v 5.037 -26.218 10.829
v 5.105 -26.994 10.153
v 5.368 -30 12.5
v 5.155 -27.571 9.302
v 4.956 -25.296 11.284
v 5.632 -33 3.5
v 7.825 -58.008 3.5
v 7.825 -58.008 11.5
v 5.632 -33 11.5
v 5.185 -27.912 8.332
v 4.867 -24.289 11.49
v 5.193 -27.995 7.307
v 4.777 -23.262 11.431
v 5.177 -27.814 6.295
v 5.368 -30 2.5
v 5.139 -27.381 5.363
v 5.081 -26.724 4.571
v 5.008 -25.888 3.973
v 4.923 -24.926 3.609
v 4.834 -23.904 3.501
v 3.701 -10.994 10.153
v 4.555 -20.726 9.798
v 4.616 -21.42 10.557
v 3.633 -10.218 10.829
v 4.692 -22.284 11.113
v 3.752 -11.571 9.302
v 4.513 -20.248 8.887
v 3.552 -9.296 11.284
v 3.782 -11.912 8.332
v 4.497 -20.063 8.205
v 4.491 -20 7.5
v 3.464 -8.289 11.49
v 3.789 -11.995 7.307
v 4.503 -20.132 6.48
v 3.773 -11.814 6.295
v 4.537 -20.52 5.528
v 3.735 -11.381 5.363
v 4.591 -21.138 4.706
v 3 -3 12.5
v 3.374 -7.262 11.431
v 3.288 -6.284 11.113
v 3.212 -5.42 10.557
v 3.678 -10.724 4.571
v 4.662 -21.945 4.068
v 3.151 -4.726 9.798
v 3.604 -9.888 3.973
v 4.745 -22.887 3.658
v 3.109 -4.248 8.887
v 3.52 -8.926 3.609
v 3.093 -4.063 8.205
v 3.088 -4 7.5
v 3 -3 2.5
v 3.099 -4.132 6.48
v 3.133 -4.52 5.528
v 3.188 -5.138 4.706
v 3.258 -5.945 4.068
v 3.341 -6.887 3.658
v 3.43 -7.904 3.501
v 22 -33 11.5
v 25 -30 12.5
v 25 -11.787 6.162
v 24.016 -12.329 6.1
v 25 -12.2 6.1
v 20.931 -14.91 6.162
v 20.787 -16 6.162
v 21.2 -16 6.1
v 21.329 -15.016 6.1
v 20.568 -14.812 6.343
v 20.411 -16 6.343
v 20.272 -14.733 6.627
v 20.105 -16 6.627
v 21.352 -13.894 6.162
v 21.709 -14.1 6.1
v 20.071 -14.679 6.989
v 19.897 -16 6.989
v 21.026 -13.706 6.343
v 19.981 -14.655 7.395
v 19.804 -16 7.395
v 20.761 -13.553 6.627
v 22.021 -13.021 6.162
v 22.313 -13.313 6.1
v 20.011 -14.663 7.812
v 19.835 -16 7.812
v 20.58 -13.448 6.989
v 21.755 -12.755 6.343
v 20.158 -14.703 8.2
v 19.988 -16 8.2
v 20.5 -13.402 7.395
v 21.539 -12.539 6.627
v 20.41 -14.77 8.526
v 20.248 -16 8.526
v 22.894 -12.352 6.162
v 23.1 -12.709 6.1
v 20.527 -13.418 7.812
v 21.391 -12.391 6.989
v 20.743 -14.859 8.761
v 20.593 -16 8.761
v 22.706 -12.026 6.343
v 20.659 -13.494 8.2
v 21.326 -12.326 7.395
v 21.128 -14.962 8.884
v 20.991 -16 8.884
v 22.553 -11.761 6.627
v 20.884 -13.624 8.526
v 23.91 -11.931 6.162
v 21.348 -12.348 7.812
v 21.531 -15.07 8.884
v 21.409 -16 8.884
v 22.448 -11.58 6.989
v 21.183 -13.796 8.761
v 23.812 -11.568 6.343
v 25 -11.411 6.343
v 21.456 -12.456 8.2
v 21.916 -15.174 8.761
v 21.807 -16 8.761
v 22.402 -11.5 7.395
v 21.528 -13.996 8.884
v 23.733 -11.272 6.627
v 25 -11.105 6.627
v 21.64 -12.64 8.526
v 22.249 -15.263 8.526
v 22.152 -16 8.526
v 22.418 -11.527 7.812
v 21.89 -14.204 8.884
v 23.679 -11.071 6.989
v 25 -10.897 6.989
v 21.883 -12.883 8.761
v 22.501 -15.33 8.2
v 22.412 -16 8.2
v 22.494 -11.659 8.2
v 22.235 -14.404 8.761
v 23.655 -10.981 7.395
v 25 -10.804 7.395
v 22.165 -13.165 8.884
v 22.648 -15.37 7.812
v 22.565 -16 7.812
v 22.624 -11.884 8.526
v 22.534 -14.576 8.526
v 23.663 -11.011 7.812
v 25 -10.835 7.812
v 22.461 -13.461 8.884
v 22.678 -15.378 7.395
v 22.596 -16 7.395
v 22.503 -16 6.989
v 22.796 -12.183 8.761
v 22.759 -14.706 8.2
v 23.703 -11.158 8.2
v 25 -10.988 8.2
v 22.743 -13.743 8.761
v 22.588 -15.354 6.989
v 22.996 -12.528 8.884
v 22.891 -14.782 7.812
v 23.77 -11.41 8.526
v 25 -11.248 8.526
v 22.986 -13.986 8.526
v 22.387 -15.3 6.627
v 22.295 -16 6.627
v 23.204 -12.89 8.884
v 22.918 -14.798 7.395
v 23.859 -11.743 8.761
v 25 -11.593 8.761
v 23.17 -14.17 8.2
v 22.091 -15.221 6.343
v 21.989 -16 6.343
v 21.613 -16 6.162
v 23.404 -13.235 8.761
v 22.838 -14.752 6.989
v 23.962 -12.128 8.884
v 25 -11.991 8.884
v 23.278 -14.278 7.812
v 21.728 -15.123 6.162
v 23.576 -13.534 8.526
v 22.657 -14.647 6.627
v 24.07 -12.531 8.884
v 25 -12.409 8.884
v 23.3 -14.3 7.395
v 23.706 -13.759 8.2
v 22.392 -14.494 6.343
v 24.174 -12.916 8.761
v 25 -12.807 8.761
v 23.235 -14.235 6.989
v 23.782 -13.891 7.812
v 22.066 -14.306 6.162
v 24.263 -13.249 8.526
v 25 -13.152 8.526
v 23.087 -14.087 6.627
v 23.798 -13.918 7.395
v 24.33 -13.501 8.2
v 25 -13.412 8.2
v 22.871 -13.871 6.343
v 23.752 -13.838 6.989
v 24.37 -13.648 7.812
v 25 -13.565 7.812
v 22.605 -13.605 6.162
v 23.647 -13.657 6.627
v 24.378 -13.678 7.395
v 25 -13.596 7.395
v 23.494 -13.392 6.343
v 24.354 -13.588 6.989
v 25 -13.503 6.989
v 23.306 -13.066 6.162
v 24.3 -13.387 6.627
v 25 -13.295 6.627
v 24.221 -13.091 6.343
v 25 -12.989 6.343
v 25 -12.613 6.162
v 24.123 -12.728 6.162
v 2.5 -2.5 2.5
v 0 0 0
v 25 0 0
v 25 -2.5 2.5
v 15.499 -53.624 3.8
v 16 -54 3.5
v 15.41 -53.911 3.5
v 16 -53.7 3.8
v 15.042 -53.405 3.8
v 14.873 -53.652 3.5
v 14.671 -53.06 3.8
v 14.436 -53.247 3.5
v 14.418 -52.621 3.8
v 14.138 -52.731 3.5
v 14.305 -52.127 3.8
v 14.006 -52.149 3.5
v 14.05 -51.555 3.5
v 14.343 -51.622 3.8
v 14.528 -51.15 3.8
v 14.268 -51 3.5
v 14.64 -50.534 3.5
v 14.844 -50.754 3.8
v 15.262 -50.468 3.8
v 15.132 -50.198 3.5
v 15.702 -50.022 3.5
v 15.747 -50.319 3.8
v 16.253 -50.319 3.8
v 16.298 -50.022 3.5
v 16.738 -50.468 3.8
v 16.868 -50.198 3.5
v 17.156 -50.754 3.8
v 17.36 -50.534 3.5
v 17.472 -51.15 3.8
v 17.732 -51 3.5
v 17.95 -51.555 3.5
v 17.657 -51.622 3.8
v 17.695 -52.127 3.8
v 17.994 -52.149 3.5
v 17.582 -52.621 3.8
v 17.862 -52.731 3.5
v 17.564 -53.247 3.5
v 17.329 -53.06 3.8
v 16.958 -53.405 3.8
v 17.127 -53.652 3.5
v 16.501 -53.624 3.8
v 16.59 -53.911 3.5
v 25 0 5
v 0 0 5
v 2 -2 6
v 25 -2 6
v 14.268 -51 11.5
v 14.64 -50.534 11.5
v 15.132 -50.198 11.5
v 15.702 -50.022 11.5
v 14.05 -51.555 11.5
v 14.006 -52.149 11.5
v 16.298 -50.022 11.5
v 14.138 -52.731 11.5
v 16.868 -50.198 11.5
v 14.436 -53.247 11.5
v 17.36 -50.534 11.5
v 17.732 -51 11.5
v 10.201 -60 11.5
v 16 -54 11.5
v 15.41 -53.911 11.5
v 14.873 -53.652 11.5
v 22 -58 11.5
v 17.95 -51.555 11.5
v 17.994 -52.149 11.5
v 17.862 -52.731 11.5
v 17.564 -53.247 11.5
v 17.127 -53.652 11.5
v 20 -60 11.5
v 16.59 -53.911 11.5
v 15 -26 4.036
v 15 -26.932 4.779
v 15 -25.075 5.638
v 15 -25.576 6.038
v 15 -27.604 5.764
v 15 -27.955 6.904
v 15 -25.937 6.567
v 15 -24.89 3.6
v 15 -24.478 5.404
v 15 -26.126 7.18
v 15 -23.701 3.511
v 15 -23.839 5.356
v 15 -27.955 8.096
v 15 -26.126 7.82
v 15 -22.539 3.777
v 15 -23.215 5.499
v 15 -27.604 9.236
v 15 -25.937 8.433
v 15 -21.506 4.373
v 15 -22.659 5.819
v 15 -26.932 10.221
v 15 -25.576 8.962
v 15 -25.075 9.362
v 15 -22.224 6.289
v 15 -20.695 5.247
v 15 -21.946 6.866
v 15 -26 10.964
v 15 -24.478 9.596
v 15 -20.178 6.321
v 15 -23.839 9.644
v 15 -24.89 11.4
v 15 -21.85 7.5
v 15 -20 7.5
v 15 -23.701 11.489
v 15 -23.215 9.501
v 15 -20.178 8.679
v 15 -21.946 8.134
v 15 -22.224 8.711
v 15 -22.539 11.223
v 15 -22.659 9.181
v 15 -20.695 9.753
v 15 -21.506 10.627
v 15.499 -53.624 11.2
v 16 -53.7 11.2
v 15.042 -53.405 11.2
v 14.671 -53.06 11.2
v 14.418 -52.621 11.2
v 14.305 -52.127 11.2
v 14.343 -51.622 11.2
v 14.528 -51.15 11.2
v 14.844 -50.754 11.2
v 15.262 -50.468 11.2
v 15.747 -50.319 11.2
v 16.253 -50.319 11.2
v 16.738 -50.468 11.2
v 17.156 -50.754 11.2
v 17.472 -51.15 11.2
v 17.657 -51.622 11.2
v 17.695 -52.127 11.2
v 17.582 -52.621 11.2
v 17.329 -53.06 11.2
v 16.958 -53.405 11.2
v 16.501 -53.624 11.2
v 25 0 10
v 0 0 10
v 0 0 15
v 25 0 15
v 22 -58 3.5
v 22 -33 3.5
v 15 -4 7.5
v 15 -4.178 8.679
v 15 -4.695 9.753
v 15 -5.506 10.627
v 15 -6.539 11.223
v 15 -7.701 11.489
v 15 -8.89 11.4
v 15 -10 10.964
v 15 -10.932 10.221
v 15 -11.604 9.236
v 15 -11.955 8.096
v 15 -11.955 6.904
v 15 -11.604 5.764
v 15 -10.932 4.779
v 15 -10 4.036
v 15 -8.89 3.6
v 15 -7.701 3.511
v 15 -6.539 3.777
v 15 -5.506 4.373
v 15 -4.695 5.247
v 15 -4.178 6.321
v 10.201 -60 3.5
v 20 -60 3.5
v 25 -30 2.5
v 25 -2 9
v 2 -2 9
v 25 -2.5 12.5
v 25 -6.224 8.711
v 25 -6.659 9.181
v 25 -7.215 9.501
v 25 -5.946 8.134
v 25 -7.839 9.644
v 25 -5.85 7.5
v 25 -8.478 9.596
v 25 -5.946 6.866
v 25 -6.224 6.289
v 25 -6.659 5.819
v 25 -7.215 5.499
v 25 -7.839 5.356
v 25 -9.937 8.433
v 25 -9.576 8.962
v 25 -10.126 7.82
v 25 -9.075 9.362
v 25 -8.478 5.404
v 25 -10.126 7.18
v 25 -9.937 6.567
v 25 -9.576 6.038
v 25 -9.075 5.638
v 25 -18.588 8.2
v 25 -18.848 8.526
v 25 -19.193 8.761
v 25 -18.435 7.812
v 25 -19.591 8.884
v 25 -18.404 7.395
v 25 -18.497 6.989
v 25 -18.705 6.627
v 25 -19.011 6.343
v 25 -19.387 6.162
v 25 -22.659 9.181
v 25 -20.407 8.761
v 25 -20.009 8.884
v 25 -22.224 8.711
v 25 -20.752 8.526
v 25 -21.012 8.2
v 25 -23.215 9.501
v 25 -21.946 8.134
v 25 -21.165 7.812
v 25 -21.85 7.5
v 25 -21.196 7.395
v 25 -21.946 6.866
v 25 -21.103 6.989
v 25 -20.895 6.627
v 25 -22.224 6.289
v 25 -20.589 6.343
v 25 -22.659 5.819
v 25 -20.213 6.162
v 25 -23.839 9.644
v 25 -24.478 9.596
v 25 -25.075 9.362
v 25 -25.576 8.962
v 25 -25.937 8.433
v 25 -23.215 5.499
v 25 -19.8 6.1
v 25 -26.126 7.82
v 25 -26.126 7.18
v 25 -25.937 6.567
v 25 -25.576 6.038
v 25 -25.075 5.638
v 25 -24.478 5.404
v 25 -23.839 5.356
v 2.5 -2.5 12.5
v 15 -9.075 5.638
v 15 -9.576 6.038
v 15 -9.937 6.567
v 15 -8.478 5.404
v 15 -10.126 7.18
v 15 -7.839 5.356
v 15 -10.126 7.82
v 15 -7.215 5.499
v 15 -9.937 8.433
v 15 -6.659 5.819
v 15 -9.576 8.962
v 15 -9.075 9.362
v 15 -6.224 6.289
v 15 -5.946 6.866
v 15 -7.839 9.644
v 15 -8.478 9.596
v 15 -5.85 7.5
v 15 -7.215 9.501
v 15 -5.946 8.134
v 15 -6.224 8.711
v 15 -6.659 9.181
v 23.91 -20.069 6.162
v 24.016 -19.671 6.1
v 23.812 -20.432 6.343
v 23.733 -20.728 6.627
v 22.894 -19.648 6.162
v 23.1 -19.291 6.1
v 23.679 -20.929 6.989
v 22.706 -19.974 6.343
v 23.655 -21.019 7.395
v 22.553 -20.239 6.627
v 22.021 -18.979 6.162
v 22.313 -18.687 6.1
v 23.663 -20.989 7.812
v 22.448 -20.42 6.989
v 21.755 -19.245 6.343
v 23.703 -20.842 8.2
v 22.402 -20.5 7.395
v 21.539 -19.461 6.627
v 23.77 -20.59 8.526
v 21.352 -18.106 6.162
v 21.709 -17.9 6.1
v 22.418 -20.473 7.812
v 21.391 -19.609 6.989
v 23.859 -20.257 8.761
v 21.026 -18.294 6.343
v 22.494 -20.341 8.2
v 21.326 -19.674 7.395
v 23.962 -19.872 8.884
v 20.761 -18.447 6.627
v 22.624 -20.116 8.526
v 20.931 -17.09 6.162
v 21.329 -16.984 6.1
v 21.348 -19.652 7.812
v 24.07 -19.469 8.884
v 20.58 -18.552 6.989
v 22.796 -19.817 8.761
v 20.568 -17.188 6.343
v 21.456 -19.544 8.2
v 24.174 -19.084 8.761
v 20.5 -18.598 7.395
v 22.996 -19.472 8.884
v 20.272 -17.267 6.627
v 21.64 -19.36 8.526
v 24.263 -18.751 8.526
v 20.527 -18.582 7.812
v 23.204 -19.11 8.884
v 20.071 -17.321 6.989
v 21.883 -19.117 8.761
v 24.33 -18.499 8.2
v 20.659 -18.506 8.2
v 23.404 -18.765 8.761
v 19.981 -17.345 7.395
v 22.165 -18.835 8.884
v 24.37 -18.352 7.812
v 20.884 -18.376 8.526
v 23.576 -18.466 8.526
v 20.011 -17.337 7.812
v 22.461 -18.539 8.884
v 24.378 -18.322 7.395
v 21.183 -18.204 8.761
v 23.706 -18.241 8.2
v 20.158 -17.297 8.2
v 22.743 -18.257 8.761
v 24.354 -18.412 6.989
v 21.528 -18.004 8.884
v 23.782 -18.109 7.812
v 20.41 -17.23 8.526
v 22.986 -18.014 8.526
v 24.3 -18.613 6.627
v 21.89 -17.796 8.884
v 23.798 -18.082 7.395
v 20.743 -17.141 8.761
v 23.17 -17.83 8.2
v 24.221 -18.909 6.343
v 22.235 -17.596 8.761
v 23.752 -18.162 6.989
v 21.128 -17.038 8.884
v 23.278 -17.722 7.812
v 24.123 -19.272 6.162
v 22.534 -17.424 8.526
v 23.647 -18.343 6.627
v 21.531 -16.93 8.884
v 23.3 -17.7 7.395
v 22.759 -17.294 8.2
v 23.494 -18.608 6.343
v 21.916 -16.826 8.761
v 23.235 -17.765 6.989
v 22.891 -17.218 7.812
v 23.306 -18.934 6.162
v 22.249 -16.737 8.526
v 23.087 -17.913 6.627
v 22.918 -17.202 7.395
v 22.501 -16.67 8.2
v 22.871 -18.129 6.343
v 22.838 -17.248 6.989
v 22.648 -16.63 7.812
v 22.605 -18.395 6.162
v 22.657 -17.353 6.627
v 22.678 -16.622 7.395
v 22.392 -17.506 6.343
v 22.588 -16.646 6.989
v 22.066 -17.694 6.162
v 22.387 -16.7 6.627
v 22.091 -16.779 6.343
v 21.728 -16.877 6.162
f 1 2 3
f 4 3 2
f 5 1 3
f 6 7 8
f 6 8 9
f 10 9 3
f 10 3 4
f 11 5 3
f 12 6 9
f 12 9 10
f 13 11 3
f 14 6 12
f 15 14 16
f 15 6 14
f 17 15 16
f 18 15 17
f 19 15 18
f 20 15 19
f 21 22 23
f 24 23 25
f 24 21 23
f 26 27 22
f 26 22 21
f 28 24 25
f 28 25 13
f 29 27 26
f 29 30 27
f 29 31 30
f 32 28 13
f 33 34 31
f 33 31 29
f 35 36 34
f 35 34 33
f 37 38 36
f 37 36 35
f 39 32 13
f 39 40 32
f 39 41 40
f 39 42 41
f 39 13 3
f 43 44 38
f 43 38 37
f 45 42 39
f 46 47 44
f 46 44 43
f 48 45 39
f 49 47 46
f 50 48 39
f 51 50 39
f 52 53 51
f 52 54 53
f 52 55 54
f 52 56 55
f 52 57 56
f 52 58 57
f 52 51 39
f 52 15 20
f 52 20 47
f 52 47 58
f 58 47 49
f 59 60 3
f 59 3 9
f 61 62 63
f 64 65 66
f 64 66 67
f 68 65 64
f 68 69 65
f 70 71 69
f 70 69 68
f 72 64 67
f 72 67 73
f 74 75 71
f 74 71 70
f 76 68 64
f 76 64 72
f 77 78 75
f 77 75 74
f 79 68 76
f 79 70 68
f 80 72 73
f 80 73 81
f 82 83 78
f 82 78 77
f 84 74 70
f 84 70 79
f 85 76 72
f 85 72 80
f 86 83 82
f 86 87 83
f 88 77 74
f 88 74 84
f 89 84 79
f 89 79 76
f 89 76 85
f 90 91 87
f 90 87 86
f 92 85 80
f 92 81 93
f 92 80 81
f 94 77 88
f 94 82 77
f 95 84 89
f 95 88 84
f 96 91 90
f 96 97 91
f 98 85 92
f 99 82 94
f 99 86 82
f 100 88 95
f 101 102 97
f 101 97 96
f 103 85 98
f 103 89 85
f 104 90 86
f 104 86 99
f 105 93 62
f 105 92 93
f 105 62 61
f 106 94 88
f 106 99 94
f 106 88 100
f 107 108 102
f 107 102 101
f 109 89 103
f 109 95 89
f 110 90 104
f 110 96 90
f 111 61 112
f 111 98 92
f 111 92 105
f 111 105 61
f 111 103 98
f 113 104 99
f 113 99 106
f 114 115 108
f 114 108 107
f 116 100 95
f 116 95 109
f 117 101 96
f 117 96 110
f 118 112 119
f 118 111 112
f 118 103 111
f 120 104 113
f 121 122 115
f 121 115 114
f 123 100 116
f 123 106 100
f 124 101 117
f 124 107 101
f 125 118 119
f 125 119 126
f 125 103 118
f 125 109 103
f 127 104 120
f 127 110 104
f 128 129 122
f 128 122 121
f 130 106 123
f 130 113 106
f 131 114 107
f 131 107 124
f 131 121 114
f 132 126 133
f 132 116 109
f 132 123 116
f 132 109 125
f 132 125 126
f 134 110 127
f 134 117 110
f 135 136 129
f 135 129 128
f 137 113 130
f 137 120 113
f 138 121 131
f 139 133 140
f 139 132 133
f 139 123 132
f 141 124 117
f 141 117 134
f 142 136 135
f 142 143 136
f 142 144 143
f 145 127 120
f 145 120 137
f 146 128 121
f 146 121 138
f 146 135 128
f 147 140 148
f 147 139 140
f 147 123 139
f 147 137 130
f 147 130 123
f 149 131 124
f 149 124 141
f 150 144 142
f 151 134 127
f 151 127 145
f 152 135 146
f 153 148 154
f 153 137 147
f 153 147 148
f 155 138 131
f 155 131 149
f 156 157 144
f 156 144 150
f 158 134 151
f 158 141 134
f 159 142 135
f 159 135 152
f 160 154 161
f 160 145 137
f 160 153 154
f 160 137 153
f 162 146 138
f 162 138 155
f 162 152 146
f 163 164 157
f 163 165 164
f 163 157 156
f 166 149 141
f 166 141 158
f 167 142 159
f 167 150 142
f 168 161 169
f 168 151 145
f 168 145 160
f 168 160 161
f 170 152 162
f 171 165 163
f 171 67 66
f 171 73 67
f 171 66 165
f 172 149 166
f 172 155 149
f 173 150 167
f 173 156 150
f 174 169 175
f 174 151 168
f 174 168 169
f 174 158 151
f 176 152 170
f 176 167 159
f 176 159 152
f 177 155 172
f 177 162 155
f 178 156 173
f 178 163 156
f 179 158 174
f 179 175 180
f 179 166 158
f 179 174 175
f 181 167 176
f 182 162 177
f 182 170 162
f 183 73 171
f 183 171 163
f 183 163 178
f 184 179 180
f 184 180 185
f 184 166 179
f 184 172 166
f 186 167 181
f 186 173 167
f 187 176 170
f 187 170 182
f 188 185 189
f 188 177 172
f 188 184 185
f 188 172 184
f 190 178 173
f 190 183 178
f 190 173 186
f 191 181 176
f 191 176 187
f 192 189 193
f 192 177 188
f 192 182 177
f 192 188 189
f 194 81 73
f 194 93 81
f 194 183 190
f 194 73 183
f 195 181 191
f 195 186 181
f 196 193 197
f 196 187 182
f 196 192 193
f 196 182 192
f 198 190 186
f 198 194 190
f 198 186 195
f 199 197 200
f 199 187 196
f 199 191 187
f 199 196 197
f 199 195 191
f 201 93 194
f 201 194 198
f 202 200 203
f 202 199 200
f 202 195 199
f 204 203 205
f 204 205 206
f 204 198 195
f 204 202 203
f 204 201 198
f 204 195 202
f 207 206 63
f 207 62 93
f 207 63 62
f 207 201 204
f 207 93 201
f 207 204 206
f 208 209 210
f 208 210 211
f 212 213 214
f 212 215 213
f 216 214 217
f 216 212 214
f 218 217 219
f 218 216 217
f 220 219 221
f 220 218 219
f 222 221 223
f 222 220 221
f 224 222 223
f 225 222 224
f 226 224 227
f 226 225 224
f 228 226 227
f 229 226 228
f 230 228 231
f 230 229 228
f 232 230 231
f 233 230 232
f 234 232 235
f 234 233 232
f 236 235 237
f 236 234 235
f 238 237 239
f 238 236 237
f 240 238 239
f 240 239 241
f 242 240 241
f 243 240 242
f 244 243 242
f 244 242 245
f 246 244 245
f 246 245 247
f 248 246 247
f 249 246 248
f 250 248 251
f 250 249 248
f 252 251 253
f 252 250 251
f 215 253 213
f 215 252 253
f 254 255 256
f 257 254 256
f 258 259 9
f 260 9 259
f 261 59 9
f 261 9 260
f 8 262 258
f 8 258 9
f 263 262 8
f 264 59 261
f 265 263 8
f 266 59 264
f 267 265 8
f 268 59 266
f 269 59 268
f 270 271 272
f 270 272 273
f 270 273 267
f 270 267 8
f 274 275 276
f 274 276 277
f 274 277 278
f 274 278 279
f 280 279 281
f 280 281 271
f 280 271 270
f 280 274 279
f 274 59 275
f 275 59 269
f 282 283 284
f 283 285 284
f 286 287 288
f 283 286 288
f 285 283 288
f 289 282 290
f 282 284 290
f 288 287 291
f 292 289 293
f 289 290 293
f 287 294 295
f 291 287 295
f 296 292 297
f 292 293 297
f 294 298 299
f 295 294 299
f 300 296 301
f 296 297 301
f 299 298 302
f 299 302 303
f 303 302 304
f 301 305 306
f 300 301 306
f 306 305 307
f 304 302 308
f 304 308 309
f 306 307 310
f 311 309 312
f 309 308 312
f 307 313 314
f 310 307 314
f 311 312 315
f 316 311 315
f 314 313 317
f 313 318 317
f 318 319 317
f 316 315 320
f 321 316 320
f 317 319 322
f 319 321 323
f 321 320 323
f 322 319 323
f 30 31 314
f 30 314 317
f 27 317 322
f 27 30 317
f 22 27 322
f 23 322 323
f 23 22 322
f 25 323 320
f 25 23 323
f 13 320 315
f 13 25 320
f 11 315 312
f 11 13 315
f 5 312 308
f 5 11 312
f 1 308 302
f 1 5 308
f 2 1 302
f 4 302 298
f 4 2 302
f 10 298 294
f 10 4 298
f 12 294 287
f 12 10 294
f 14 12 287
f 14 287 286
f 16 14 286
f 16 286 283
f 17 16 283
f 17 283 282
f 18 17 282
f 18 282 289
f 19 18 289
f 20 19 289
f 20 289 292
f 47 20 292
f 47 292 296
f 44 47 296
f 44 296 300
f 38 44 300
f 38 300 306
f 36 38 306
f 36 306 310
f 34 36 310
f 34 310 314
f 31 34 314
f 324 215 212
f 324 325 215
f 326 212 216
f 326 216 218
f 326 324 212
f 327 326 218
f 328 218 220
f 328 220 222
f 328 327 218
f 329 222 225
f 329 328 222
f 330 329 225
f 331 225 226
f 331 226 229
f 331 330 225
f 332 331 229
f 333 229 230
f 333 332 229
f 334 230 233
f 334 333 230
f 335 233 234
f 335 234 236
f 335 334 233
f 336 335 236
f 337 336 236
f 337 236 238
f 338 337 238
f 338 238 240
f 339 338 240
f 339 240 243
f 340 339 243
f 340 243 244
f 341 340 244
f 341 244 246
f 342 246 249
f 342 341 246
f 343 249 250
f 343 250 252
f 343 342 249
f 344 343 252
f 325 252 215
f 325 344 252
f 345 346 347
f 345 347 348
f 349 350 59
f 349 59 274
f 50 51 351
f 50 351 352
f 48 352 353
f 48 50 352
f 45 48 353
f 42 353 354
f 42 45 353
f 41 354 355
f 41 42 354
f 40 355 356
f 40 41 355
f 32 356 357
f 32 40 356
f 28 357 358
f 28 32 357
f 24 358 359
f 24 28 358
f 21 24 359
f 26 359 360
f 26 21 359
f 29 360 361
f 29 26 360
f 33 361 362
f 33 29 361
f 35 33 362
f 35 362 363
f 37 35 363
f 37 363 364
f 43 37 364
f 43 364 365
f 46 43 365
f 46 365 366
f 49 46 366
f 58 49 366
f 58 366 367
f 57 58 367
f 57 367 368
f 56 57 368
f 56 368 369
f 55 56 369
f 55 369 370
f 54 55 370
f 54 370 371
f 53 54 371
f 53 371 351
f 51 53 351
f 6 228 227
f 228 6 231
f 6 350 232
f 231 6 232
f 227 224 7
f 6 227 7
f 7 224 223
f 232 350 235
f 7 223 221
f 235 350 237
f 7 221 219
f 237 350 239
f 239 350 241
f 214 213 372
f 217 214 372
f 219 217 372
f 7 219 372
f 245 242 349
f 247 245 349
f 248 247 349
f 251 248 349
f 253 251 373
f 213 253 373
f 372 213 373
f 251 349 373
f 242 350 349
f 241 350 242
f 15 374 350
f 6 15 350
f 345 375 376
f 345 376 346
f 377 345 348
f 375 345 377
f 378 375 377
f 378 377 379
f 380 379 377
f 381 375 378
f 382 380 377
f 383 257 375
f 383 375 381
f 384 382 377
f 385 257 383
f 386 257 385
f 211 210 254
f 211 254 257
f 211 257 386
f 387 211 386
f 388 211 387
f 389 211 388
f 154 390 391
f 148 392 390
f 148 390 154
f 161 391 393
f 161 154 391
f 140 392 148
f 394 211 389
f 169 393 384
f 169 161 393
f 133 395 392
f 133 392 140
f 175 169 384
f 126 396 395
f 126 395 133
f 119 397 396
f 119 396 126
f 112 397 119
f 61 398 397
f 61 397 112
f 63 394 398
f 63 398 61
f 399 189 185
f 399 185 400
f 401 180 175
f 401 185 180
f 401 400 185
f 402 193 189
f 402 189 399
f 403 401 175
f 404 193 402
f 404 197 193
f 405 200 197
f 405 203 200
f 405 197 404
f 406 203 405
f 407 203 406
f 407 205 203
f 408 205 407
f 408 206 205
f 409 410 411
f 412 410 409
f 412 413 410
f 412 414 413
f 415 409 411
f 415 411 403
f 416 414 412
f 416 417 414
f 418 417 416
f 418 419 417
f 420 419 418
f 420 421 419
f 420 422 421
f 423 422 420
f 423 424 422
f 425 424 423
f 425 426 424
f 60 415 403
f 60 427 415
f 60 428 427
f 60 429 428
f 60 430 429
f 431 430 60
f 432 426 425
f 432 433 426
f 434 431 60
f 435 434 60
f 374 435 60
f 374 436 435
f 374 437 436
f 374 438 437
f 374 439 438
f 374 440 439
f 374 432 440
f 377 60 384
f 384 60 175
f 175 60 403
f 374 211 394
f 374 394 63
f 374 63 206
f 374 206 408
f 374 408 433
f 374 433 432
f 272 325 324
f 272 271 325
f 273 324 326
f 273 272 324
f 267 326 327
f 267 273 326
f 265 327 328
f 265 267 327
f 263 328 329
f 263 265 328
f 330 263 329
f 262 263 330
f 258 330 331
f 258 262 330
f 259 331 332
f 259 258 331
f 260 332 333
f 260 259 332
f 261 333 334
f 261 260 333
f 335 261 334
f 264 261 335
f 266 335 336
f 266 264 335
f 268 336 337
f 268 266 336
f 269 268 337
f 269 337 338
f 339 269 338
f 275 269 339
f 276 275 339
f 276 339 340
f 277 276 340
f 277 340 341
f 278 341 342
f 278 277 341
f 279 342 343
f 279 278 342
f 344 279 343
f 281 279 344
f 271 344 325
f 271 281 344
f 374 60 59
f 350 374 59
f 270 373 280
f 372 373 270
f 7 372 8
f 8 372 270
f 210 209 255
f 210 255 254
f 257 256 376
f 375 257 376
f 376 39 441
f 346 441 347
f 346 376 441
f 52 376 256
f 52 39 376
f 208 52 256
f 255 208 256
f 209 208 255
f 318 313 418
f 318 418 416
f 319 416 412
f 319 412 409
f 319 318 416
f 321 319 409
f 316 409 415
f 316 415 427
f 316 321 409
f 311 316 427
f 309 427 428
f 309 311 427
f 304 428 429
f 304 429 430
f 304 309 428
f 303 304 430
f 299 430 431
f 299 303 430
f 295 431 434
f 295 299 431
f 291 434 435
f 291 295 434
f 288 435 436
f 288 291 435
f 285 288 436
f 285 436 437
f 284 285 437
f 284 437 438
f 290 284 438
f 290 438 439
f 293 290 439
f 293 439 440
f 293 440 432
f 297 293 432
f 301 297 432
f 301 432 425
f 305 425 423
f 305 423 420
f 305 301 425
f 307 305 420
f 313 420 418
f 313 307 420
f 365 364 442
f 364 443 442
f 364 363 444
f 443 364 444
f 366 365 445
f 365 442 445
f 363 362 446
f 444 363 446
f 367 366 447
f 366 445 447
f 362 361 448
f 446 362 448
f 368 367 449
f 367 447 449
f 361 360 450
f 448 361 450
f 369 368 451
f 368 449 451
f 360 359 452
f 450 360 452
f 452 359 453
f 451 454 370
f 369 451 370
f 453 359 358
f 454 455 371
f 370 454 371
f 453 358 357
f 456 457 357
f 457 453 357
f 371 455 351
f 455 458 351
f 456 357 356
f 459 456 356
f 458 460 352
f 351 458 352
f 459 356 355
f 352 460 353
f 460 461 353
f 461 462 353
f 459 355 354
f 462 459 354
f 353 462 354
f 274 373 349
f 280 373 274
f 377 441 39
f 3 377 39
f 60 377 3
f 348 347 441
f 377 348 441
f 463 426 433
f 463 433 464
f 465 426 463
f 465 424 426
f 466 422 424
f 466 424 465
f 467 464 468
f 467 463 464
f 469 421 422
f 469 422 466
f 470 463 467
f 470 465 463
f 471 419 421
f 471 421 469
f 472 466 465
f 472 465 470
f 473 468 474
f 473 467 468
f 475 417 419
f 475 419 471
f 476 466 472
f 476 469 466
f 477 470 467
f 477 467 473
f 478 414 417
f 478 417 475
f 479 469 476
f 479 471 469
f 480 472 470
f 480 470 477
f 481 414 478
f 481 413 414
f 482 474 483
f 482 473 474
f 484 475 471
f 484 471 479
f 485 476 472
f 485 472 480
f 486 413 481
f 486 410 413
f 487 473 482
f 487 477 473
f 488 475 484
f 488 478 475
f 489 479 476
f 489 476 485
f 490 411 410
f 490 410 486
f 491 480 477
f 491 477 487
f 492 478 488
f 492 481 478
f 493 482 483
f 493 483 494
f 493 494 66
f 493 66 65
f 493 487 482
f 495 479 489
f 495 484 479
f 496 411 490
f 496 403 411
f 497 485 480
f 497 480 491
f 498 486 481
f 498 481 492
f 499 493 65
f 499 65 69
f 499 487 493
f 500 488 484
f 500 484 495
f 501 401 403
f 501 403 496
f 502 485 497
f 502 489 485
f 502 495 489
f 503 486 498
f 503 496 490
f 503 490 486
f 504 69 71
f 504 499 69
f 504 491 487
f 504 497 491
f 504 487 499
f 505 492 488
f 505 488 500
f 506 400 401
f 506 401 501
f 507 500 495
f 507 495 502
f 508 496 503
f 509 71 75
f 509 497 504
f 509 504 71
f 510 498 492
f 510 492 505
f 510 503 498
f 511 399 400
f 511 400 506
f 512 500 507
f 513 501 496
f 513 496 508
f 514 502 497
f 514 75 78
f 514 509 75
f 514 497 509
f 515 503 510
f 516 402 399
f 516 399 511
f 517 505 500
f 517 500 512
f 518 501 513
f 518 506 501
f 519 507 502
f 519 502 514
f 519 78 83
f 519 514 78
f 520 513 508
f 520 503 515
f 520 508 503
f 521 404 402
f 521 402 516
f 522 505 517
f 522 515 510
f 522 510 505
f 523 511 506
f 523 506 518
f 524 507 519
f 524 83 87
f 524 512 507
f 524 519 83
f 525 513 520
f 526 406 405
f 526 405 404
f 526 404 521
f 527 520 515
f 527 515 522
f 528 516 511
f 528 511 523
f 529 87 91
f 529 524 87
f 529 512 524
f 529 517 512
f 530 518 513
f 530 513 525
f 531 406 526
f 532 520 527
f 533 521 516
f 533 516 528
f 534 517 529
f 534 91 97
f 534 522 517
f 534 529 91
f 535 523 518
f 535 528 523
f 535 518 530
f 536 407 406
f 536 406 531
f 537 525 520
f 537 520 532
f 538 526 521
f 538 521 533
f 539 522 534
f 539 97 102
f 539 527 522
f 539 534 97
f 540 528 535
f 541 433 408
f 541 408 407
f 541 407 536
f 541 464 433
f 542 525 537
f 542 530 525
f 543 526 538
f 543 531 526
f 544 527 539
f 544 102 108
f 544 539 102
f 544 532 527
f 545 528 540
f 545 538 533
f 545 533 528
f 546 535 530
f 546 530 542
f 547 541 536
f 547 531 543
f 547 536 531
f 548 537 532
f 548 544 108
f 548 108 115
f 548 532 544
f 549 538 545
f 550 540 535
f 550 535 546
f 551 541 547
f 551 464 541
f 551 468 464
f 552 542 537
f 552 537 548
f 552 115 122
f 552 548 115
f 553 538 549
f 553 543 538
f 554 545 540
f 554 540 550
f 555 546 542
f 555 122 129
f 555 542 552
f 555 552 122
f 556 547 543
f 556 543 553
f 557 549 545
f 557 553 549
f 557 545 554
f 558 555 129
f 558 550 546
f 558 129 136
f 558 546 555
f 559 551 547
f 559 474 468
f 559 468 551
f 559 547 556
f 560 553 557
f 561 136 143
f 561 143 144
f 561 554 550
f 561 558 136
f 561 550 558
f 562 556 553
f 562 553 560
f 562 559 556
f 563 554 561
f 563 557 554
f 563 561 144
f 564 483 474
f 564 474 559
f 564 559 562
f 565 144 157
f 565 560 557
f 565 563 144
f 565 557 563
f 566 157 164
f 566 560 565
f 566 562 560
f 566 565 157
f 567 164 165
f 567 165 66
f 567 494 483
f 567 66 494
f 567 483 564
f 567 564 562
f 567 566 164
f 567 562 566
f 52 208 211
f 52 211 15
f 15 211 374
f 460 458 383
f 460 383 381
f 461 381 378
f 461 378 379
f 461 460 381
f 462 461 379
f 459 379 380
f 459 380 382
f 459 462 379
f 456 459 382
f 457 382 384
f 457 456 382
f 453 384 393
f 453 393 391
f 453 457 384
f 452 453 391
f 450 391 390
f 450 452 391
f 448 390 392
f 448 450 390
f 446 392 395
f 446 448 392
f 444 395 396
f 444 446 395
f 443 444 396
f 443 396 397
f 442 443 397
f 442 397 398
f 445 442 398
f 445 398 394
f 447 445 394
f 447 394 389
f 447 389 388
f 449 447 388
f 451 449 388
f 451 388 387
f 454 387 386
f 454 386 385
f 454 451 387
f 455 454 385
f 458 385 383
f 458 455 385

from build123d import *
from OCP.BRepFilletAPI import BRepFilletAPI_MakeChamfer

# Parameters (mm, degrees)
BODY_DEPTH                 = 15
SHAPE_CUT_DEPTH            = 67.708320321
RAIL_CUTOUT_DEPTH          = 67.708320321
GUIDING_SCREWS_START       = 3.087719198
GUIDING_SCREWS_OUTLINE_R   = 4
GUIDING_SCREWS_DEPTH       = 11.912280802
GUIDING_SCREWS_START_2     = 15
GUIDING_SCREWS_2_OUTLINE_R = 2.15
GUIDING_SCREWS_2_DEPTH     = 10
SKETCH6_R                  = 1.4
TONG_TIP_CHAMFERS_SIZE     = 2
TONG_TIP_CHAMFERS_SIZE2    = 2.200726077


# Read off the part's stored shape, not the designer's step: guiding_screws
with BuildPart() as part:
    # Sketch1 → body (new body)
    with BuildSketch(Plane.XY):
        Polygon((0, 0), (25, 0), (25, -30), (22, -33), (22, -60), (8, -60), (3, -3), align=None)
    extrude(amount=BODY_DEPTH)

    # Sketch2 → shape_cut (cut, through all)
    with BuildSketch(Plane(origin=(25, 0, 0), x_dir=(0, 0, -1), z_dir=(1, 0, 0))):
        Polygon((-15, 0), (-12.5, -2.5), (-12.5, -30), (-11.5, -33), (-11.5, -60), (-15, -60), align=None)
        Polygon((0, 0), (-2.5, -2.5), (-2.5, -30), (-3.5, -33), (-3.5, -60), (0, -60), align=None)
    extrude(amount=-SHAPE_CUT_DEPTH, mode=Mode.SUBTRACT)

    # Sketch3 → rail_cutout (cut, through all)
    with BuildSketch(Plane(origin=(25, 0, 0), x_dir=(0, 0, -1), z_dir=(1, 0, 0))):
        Polygon((-10, 0), (-5, 0), (-6, -2), (-9, -2), align=None)
    extrude(amount=-RAIL_CUTOUT_DEPTH, mode=Mode.SUBTRACT)

    # guiding_screws outline → guiding_screws (cut)
    with BuildSketch(Plane.YZ.offset(GUIDING_SCREWS_START)):
        with Locations((-24, 7.5)):
            Circle(GUIDING_SCREWS_OUTLINE_R)
        with Locations((-8, 7.5)):
            Circle(GUIDING_SCREWS_OUTLINE_R)
    extrude(amount=GUIDING_SCREWS_DEPTH, mode=Mode.SUBTRACT)

    # guiding_screws 2 outline → guiding_screws 2 (cut)
    with BuildSketch(Plane.YZ.offset(GUIDING_SCREWS_START_2)):
        with Locations((-24, 7.5)):
            Circle(GUIDING_SCREWS_2_OUTLINE_R)
        with Locations((-8, 7.5)):
            Circle(GUIDING_SCREWS_2_OUTLINE_R)
    extrude(amount=GUIDING_SCREWS_2_DEPTH, mode=Mode.SUBTRACT)

    # Sketch6 → rope_connector_cutout (revolve, cut)
    with BuildSketch(Plane(origin=(25, 0, 0), x_dir=(0, 0, -1), z_dir=(1, 0, 0)), mode=Mode.PRIVATE) as rope_connector_cutout_sk:
        with Locations((-7.5, -12.2)):
            Circle(SKETCH6_R)
    revolve(rope_connector_cutout_sk.sketch.rotate(Axis((25, -16, 12.5), (0, 0, -1)), 270), axis=Axis((25, -16, 12.5), (0, 0, -1)), mode=Mode.SUBTRACT)

    # tong_tip_chamfers: one chamfer whose edges measure the first distance from different faces: ONE call of the kernel's chamfer builder (chamfer() names one face for all edges)
    tong_tip_chamfers_edges_1 = [part.edges().sort_by_distance(p)[0] for p in [
        (22, -60, 7.5),
    ]]
    tong_tip_chamfers_edges_2 = [part.edges().sort_by_distance(p)[0] for p in [
        (8, -60, 7.5),
    ]]
    tong_tip_chamfers_side_2 = [part.faces().sort_by_distance(p)[0] for p in [
        (5.65880617, -33.310390339, 7.5),
    ]]
    tong_tip_chamfers = BRepFilletAPI_MakeChamfer(part.part.solid().wrapped)
    for e in tong_tip_chamfers_edges_1:
        tong_tip_chamfers.Add(TONG_TIP_CHAMFERS_SIZE, e.wrapped)
    for e in tong_tip_chamfers_edges_2:
        tong_tip_chamfers.Add(TONG_TIP_CHAMFERS_SIZE, TONG_TIP_CHAMFERS_SIZE2, e.wrapped, tong_tip_chamfers_side_2[0].wrapped)  # the first distance lies on this face
    add(Compound.cast(tong_tip_chamfers.Shape()), mode=Mode.REPLACE)

    # Sketch9 → tong_tip_hole (revolve, cut)
    with BuildSketch(Plane(origin=(16, -52, 11.5), x_dir=(0, -1, 0), z_dir=(1, 0, 0))):
        Polygon((0, 0), (0, 8), (2, 8), (1.7, 7.7), (1.7, 0.3), (2, 0), align=None)
    revolve(axis=Axis((16, -52, 17.85), (0, 0, -1)), mode=Mode.SUBTRACT)


solid = part.part
